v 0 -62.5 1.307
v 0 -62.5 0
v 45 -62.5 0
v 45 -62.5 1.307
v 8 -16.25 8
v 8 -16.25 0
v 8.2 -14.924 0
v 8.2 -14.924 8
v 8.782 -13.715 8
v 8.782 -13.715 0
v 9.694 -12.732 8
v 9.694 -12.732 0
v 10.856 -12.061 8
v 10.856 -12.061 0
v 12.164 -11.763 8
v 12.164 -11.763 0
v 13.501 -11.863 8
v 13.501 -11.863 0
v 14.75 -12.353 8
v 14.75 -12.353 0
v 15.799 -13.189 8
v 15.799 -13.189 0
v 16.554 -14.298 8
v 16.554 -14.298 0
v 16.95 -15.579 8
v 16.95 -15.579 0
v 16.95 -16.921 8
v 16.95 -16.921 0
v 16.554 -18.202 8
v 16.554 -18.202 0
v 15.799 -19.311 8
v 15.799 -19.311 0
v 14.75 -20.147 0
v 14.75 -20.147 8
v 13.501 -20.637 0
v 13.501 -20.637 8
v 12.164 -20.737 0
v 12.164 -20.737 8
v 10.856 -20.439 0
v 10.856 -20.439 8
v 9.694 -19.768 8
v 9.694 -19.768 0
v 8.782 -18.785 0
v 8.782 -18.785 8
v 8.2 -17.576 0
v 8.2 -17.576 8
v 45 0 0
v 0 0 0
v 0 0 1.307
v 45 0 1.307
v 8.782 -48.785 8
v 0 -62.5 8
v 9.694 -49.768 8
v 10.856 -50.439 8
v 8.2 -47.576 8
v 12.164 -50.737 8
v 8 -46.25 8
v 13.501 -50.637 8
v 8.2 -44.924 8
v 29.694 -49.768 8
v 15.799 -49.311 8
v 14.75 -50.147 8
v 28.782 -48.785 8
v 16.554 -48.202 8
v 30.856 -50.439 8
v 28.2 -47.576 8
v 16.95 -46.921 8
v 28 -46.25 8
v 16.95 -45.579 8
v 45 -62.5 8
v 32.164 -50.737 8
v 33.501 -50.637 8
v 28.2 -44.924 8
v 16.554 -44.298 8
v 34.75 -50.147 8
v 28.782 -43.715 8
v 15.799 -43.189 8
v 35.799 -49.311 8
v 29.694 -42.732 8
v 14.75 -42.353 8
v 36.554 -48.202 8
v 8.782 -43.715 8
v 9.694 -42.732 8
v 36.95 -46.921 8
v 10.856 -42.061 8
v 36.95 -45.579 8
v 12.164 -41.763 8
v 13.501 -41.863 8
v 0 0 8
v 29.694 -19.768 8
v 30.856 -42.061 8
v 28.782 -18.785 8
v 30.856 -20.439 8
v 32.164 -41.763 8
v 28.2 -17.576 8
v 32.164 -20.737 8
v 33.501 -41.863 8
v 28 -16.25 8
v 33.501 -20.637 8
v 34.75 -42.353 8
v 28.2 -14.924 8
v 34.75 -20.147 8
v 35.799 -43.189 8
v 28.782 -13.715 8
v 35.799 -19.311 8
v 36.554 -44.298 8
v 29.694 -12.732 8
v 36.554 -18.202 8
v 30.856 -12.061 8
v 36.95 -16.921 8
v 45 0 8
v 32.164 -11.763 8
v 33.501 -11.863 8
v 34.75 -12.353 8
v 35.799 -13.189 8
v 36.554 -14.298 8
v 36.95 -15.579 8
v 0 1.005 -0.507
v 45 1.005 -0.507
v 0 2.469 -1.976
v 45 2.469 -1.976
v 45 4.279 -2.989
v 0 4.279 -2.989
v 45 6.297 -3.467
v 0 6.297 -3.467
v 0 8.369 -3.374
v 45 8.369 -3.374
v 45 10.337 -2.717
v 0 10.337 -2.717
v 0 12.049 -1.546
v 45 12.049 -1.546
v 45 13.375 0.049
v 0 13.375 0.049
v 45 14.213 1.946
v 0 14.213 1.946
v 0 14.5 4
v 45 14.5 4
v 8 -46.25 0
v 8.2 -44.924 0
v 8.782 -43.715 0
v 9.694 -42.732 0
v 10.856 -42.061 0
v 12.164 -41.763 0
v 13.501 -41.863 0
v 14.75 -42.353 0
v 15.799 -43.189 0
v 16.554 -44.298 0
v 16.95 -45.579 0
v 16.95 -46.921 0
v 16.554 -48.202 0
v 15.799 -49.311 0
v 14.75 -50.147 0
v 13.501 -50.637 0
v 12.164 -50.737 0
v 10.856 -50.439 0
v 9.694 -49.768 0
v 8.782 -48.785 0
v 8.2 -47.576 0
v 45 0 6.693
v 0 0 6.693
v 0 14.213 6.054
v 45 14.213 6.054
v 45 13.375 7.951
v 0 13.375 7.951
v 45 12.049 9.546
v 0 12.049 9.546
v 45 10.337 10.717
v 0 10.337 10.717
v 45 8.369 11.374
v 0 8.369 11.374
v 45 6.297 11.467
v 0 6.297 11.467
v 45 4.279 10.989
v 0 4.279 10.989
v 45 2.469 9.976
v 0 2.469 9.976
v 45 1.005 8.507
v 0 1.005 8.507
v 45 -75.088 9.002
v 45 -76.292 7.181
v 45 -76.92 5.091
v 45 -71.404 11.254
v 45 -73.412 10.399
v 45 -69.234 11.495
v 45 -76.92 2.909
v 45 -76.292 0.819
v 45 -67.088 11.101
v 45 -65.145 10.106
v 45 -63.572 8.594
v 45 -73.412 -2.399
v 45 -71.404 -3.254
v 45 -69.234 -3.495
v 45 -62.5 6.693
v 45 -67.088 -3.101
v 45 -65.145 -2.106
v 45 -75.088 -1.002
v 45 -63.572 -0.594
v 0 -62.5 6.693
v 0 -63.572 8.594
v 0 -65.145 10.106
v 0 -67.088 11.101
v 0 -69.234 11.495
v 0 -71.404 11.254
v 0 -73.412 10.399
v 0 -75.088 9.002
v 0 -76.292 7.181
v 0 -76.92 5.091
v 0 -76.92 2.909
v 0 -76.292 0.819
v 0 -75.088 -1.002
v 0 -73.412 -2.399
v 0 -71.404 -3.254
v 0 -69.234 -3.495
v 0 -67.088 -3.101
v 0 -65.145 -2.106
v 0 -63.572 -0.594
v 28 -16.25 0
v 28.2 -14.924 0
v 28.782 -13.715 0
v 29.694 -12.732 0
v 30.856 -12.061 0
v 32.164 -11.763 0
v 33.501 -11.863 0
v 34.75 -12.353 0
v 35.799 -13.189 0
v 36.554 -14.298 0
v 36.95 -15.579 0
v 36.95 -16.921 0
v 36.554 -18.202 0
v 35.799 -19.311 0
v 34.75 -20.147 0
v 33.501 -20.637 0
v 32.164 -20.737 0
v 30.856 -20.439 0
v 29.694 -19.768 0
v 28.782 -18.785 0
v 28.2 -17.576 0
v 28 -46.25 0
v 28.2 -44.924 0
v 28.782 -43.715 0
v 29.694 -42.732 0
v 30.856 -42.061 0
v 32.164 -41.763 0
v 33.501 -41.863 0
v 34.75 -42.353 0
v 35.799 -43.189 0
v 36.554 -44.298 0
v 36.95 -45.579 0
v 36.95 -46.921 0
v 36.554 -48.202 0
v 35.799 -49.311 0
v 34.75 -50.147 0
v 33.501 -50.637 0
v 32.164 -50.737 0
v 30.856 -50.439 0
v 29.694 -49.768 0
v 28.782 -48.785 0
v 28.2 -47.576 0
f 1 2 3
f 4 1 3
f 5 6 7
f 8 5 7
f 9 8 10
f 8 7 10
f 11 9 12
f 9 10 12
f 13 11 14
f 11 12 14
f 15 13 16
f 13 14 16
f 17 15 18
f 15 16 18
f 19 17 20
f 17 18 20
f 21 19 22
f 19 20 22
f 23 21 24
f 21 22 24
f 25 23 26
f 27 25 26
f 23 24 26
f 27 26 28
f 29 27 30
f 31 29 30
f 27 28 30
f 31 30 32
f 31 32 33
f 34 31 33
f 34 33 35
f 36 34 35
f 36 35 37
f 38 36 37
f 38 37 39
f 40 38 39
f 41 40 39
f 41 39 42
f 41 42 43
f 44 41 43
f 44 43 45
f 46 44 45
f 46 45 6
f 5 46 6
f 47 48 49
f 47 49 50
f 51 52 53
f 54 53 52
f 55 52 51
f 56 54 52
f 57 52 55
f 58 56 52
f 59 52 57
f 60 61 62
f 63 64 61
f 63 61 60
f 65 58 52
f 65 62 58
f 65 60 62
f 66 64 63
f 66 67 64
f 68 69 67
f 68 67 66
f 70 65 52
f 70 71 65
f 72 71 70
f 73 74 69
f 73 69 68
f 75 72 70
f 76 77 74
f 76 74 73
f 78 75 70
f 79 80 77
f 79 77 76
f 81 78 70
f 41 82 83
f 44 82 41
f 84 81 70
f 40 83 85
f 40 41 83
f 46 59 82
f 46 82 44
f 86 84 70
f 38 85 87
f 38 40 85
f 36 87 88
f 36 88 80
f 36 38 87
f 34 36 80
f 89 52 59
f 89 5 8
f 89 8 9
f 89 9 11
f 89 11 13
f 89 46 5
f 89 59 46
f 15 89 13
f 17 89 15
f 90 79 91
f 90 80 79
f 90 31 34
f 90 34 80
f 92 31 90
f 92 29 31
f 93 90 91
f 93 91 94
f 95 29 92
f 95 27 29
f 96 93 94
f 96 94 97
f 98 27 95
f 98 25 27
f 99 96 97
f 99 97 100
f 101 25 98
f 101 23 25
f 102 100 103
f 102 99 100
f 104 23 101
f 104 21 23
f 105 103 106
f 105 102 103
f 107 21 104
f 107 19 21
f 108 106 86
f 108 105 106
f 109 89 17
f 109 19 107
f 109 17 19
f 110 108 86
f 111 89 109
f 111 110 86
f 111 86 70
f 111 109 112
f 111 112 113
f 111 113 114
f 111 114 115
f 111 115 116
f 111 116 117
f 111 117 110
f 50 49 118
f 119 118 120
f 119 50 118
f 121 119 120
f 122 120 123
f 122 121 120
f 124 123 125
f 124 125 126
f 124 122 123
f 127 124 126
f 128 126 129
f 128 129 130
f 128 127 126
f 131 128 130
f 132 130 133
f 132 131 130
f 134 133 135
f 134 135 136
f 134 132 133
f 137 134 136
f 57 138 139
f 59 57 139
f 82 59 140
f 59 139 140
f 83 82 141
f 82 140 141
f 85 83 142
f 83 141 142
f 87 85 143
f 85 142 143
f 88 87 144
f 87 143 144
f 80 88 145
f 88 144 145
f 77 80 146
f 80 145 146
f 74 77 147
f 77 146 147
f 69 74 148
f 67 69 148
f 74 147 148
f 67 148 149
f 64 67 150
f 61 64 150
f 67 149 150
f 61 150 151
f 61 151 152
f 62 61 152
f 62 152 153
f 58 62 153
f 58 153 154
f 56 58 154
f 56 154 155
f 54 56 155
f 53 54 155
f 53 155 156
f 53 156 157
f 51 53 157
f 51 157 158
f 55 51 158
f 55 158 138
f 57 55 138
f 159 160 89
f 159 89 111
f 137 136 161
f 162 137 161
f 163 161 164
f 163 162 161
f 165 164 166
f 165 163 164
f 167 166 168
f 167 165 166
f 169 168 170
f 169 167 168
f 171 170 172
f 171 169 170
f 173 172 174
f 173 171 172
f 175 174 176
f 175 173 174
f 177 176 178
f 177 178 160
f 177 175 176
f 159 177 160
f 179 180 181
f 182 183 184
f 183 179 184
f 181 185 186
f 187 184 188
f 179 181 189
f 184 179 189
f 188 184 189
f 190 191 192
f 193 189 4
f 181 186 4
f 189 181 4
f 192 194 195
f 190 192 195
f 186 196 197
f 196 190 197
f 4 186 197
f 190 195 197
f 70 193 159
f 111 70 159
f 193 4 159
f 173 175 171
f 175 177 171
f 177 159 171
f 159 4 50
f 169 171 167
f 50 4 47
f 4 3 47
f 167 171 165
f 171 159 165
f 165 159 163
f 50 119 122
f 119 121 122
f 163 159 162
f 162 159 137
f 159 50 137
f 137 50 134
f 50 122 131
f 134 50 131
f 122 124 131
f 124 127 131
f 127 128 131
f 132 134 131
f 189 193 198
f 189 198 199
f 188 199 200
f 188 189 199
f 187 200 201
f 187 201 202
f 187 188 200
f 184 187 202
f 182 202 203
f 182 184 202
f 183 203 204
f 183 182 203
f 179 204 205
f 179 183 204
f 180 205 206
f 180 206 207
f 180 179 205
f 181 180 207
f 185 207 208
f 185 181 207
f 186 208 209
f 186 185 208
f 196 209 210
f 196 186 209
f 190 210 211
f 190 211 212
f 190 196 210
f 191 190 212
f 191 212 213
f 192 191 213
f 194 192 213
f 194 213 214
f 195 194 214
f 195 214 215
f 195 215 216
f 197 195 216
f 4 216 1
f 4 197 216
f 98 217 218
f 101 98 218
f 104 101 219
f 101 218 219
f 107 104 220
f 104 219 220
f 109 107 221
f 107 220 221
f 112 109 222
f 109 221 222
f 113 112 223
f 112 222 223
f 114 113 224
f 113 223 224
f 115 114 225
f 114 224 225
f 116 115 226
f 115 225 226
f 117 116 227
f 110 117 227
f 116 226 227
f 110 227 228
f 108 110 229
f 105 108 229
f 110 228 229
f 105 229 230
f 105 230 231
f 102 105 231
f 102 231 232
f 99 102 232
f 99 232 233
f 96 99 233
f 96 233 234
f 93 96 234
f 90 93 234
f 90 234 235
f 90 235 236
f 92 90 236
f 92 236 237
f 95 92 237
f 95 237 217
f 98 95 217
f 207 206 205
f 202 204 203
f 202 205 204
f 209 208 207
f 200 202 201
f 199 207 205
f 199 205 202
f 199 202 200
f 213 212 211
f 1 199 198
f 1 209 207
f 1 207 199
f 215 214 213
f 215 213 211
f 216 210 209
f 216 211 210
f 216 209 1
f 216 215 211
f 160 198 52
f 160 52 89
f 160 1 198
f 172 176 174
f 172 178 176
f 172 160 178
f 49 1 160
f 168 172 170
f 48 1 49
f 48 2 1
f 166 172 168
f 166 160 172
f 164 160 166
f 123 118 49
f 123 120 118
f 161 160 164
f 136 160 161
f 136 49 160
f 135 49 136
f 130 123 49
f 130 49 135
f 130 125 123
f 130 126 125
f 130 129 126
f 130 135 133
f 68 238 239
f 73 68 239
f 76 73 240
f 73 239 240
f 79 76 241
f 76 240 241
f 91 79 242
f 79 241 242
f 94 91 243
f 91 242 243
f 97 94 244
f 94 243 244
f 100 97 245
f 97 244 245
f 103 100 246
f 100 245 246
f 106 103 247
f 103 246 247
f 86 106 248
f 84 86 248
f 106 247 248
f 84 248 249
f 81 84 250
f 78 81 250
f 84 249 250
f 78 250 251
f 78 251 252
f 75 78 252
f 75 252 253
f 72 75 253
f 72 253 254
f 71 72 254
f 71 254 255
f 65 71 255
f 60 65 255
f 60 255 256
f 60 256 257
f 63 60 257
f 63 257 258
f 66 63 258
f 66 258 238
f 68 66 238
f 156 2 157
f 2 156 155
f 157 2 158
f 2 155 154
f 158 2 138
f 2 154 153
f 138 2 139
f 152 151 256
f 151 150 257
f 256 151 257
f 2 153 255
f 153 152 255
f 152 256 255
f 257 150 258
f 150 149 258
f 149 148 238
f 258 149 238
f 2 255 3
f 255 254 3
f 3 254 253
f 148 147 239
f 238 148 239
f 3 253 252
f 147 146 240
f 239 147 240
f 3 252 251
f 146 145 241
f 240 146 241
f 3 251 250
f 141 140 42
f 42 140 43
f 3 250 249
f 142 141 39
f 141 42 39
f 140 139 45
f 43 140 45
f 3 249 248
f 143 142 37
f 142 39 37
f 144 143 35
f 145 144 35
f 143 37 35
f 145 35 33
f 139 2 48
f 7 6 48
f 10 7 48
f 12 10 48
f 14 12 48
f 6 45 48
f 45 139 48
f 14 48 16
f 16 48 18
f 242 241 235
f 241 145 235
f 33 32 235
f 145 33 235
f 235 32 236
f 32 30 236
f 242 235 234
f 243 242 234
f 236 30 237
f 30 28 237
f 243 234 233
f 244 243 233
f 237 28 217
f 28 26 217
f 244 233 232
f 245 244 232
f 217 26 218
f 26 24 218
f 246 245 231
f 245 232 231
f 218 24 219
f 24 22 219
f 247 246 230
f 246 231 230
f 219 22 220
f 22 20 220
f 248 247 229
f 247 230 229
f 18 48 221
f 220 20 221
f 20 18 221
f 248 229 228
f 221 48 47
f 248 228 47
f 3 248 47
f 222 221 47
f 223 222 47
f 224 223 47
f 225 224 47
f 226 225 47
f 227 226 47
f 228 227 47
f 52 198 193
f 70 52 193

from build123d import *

# Parameters (mm, degrees)
F0_W     = 45
F0_H     = 62.5
F1_DEPTH = 8
F3_D     = 9
F3_DEPTH = 15
F3_TIP   = 2.7038727856
F5_DEPTH = 45


with BuildPart() as f1:
    # F0 (on Top) → F1 (new body)
    with BuildSketch(Plane.XY):
        with Locations((22.5, -31.25)):
            Rectangle(F0_W, F0_H)
    extrude(amount=F1_DEPTH)

    # F3
    with Locations(Plane.XY.offset(8)):
        with Locations((12.5, -16.25), (32.5, -16.25), (32.5, -46.25), (12.5, -46.25)):
            Hole(F3_D / 2, depth=F3_DEPTH)
            with Locations((0, 0, -(F3_DEPTH + F3_TIP / 2))):  # 118° drill point
                Cone(0, F3_D / 2, F3_TIP, mode=Mode.SUBTRACT)

    # F4 (on face) → F5 (join)
    with BuildSketch(Plane.YZ.offset(45)):
        with BuildLine():
            ThreePointArc((-62.5, 1.3074175964), (-62.1260593981, 2.6306936062), (-62, 4))
            ThreePointArc((-62, 4), (-62.1260593981, 5.3693063938), (-62.5, 6.6925824036))
            Line((-62.5, 6.6925824036), (-62.5, 1.3074175964))
        make_face()
        with BuildLine():
            Line((-62.5, 1.3074175964), (-62.5, 6.6925824036))
            ThreePointArc((-62.5, 6.6925824036), (-77, 4), (-62.5, 1.3074175964))
        make_face()
        with BuildLine():
            ThreePointArc((14.5, 4), (8.3693063938, 11.3739406019), (0, 6.6925824036))
            Line((0, 6.6925824036), (0, 1.3074175964))
            ThreePointArc((0, 1.3074175964), (8.3693063938, -3.3739406019), (14.5, 4))
        make_face()
    extrude(amount=-F5_DEPTH)


solid = f1.part
